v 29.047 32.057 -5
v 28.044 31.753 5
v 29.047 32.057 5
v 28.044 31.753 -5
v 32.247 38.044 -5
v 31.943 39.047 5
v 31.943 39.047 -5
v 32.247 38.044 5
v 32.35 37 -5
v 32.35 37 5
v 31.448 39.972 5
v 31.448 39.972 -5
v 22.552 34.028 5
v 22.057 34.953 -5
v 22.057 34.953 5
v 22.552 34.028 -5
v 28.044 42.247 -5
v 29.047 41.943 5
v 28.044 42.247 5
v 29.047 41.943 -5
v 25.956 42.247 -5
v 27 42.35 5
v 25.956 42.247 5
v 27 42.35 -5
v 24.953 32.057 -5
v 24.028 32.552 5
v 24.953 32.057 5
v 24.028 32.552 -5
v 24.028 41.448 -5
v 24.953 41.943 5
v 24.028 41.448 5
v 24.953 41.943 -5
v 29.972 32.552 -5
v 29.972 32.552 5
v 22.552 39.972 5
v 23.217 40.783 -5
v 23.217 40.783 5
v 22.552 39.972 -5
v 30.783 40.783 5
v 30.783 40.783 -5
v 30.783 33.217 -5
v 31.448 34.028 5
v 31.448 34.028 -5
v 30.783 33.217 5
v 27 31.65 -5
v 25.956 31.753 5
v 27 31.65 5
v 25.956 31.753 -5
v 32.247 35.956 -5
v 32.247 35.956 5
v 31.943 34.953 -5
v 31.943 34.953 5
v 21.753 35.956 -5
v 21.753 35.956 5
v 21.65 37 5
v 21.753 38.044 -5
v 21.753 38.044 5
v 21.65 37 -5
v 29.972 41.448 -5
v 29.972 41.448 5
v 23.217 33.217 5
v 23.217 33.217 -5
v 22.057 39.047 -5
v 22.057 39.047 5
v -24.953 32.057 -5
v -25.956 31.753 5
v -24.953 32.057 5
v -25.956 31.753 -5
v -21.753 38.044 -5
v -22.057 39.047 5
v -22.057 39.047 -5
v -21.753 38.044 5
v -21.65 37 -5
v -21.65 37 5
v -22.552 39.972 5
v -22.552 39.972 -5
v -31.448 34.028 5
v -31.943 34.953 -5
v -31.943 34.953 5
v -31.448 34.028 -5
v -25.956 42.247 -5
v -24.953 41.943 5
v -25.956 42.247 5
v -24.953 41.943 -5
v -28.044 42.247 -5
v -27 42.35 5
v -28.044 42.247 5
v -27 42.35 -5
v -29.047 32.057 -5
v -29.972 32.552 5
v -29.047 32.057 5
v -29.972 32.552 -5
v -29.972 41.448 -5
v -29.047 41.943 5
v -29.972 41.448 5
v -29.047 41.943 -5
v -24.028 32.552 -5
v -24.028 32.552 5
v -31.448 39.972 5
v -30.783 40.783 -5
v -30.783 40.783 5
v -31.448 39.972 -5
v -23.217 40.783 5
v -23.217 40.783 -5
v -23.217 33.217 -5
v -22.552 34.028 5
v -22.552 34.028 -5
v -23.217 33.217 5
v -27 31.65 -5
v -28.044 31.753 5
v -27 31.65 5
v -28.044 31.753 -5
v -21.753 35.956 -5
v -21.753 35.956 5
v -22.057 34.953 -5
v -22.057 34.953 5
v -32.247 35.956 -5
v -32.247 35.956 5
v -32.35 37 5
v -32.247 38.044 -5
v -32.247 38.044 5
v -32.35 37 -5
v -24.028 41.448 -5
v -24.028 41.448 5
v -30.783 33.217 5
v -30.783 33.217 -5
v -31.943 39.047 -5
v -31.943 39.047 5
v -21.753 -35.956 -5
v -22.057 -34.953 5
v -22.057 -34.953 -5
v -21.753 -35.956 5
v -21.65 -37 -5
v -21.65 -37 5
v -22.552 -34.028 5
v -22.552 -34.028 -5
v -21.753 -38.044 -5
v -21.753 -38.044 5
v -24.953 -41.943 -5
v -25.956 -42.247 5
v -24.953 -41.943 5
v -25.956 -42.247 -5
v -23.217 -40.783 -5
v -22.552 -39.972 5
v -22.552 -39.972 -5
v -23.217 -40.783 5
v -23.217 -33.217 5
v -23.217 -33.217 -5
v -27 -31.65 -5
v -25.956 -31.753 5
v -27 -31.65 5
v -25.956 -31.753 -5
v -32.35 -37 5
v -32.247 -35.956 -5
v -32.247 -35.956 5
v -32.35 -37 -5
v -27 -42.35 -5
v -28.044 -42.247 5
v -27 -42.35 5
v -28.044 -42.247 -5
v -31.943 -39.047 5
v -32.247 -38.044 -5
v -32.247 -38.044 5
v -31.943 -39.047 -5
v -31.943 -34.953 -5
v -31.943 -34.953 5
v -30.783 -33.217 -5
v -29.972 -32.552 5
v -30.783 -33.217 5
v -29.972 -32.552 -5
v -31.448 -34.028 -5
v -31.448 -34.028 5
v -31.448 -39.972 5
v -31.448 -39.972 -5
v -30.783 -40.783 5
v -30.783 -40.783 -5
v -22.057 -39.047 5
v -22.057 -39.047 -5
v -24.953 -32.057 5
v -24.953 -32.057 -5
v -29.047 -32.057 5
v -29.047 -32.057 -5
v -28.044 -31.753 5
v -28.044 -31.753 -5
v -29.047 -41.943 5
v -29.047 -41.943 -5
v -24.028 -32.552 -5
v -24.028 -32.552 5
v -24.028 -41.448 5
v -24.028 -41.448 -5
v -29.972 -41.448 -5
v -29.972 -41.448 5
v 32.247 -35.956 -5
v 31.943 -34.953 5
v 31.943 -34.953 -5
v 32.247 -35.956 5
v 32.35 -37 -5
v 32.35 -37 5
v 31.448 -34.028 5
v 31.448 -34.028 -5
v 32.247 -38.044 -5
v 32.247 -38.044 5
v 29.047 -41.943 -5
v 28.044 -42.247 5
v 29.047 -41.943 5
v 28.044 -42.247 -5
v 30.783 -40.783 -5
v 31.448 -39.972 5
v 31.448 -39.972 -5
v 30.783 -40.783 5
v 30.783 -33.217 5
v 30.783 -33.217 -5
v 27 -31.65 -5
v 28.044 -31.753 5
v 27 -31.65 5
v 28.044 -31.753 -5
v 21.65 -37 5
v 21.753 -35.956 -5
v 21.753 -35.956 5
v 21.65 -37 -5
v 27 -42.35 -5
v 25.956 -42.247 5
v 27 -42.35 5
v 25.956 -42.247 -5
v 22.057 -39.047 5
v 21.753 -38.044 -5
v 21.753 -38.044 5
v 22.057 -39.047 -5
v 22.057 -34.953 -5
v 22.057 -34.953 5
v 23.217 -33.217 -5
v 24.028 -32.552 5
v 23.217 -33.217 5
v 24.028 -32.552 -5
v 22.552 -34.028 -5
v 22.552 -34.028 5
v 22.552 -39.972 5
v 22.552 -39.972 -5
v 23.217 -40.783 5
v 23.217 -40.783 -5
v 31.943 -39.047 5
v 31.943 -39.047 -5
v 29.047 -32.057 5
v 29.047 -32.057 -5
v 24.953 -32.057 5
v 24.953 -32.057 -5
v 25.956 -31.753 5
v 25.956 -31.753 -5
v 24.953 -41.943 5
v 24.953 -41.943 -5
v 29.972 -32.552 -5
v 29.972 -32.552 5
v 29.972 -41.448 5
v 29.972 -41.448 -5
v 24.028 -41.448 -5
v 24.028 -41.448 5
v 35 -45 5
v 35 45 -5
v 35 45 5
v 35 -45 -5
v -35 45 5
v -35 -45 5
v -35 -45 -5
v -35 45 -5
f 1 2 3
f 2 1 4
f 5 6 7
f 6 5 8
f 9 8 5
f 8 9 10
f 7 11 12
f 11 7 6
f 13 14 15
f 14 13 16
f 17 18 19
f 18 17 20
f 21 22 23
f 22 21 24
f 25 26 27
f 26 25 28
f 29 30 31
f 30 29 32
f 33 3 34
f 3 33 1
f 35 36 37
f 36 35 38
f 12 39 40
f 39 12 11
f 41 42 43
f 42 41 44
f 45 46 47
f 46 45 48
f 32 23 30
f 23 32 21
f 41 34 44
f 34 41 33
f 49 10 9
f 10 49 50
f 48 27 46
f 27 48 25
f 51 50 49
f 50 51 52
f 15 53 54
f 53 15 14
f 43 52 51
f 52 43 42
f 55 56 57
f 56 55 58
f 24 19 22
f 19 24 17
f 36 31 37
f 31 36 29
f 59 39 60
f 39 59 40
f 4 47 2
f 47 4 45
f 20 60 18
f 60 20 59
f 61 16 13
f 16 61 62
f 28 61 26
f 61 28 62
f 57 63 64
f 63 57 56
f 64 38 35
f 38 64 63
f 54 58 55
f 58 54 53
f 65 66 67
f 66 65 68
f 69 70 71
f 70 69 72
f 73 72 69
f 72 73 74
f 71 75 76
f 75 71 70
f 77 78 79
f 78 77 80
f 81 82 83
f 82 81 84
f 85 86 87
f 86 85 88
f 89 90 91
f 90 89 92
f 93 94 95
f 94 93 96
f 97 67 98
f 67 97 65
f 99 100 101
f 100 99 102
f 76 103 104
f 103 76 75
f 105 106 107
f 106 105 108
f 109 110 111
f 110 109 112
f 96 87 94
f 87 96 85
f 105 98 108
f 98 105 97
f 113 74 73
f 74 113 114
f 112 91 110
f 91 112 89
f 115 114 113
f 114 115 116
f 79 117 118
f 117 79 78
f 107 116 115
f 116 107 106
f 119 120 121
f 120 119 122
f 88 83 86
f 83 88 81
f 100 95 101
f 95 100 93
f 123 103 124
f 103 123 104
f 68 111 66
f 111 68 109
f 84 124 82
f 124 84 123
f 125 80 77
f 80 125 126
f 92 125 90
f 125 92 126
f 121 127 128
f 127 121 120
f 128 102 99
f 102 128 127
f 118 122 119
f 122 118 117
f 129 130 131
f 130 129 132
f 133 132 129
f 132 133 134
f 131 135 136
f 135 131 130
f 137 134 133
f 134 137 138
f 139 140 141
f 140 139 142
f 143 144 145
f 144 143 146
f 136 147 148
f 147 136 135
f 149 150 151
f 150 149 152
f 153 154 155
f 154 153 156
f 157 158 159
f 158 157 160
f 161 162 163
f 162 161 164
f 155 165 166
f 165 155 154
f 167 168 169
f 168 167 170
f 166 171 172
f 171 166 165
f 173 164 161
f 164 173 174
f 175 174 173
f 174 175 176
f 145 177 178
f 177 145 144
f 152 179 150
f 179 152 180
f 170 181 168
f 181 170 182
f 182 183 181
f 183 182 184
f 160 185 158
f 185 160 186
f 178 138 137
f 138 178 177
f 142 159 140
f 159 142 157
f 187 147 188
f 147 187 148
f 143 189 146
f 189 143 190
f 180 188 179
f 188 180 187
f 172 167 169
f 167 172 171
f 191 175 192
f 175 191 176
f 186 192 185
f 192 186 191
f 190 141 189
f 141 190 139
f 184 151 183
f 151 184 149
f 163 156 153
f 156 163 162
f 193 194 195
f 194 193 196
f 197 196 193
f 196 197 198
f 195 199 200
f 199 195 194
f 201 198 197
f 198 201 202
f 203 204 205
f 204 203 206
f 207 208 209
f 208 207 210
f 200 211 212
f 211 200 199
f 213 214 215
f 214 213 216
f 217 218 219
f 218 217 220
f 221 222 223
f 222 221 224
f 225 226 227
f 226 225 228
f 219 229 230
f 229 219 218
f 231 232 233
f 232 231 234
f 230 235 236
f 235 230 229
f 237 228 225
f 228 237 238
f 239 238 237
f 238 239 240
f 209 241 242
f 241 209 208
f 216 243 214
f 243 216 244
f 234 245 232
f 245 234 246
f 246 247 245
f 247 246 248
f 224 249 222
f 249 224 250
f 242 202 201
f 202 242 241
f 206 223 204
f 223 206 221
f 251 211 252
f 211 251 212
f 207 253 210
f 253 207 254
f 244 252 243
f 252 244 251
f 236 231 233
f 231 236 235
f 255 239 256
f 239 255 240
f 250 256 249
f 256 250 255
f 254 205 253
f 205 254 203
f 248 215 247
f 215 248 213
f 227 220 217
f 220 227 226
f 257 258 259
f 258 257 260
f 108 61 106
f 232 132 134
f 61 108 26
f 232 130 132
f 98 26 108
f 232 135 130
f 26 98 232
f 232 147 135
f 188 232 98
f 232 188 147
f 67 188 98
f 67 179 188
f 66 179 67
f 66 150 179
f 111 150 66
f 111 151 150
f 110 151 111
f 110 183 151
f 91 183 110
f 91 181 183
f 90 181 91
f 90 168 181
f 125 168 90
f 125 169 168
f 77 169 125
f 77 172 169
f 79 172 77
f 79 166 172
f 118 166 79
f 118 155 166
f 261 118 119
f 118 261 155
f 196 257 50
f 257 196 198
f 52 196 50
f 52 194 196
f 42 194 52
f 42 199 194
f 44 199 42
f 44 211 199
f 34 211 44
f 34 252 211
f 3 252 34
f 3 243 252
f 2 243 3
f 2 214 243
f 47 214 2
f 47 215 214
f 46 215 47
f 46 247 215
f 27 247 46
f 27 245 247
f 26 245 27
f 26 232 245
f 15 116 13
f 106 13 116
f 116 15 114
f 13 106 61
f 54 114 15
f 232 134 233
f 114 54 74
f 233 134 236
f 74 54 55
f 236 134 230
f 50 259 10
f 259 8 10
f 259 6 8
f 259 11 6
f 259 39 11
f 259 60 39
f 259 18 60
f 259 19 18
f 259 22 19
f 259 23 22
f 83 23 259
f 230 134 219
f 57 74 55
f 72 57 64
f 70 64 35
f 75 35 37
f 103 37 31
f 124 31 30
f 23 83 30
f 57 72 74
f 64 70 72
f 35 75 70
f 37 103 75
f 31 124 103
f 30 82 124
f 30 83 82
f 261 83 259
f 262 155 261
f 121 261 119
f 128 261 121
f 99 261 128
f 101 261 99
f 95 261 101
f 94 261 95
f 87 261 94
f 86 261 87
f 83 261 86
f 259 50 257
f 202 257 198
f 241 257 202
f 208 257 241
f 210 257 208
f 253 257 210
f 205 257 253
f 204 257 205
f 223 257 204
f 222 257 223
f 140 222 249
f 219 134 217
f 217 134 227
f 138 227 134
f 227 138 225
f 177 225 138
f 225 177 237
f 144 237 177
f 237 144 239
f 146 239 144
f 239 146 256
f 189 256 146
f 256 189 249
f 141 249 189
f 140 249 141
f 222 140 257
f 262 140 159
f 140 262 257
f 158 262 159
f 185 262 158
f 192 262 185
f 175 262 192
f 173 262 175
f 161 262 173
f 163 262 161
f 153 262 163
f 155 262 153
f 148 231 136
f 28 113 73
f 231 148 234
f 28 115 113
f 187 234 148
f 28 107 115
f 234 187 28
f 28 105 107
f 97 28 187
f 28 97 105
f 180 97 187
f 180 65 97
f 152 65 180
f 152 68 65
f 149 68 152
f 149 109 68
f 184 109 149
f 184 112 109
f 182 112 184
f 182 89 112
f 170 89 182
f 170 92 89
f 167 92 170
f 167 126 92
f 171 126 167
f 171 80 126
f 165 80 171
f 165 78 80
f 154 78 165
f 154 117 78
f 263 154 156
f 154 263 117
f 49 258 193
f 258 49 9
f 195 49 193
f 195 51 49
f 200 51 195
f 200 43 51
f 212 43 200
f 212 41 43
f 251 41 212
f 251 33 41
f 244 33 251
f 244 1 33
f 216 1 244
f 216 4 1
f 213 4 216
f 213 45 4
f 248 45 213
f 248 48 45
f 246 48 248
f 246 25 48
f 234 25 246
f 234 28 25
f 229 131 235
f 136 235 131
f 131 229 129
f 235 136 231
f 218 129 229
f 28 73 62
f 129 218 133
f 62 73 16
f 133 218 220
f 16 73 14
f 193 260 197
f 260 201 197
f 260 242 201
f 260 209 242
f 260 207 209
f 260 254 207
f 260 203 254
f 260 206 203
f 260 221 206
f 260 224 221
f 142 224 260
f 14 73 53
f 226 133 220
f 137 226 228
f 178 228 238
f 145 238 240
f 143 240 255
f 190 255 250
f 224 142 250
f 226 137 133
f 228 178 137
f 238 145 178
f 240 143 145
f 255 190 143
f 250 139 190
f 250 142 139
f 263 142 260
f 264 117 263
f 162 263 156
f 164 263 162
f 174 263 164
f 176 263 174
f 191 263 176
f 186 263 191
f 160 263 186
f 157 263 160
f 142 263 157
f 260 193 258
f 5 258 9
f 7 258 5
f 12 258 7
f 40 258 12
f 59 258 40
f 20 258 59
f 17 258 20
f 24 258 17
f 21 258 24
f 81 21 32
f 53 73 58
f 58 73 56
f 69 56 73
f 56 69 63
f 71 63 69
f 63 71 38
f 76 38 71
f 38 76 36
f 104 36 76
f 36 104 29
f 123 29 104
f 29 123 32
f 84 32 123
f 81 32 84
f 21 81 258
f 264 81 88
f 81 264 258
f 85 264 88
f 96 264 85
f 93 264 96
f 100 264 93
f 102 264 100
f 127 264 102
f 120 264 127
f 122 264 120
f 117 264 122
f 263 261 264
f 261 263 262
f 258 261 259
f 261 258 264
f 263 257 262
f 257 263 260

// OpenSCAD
$fn = 32;

// ----------------------------------------------------------------------
// Corner plate 70 x 90 x 10
// 4 holes, centres taken from the edge offset
// ----------------------------------------------------------------------

// --- parameters (mm) ---
plate = [70, 90, 10];   // overall size (x, y, z)
holes = 4;              // number of holes the drawing asks for
bore_d = 10.5;          // nominal hole diameter from the drawing
print_allowance = 0.2;  // clearance added for printing
edge = 8;               // hole centre offset from the plate edge

// --- derived feature positions (mm) ---
hole_d = bore_d + print_allowance;  // = 10.7   hole diameter as printed
corner_x = plate[0] / 2 - edge;     // = 27   corner hole X
corner_y = plate[1] / 2 - edge;     // = 37   corner hole Y
feature_centers = [
  [corner_x, corner_y],
  [-corner_x, corner_y],
  [-corner_x, -corner_y],
  [corner_x, -corner_y]
];   // hole centres the loop below drills

// plate outline, every hole drilled through with the same cutters
difference() {
  cube(plate, center = true);
  for (centre = feature_centers)
    translate([centre[0], centre[1], 0])
      cylinder(d = hole_d, h = plate[2] + 2, center = true);
}
